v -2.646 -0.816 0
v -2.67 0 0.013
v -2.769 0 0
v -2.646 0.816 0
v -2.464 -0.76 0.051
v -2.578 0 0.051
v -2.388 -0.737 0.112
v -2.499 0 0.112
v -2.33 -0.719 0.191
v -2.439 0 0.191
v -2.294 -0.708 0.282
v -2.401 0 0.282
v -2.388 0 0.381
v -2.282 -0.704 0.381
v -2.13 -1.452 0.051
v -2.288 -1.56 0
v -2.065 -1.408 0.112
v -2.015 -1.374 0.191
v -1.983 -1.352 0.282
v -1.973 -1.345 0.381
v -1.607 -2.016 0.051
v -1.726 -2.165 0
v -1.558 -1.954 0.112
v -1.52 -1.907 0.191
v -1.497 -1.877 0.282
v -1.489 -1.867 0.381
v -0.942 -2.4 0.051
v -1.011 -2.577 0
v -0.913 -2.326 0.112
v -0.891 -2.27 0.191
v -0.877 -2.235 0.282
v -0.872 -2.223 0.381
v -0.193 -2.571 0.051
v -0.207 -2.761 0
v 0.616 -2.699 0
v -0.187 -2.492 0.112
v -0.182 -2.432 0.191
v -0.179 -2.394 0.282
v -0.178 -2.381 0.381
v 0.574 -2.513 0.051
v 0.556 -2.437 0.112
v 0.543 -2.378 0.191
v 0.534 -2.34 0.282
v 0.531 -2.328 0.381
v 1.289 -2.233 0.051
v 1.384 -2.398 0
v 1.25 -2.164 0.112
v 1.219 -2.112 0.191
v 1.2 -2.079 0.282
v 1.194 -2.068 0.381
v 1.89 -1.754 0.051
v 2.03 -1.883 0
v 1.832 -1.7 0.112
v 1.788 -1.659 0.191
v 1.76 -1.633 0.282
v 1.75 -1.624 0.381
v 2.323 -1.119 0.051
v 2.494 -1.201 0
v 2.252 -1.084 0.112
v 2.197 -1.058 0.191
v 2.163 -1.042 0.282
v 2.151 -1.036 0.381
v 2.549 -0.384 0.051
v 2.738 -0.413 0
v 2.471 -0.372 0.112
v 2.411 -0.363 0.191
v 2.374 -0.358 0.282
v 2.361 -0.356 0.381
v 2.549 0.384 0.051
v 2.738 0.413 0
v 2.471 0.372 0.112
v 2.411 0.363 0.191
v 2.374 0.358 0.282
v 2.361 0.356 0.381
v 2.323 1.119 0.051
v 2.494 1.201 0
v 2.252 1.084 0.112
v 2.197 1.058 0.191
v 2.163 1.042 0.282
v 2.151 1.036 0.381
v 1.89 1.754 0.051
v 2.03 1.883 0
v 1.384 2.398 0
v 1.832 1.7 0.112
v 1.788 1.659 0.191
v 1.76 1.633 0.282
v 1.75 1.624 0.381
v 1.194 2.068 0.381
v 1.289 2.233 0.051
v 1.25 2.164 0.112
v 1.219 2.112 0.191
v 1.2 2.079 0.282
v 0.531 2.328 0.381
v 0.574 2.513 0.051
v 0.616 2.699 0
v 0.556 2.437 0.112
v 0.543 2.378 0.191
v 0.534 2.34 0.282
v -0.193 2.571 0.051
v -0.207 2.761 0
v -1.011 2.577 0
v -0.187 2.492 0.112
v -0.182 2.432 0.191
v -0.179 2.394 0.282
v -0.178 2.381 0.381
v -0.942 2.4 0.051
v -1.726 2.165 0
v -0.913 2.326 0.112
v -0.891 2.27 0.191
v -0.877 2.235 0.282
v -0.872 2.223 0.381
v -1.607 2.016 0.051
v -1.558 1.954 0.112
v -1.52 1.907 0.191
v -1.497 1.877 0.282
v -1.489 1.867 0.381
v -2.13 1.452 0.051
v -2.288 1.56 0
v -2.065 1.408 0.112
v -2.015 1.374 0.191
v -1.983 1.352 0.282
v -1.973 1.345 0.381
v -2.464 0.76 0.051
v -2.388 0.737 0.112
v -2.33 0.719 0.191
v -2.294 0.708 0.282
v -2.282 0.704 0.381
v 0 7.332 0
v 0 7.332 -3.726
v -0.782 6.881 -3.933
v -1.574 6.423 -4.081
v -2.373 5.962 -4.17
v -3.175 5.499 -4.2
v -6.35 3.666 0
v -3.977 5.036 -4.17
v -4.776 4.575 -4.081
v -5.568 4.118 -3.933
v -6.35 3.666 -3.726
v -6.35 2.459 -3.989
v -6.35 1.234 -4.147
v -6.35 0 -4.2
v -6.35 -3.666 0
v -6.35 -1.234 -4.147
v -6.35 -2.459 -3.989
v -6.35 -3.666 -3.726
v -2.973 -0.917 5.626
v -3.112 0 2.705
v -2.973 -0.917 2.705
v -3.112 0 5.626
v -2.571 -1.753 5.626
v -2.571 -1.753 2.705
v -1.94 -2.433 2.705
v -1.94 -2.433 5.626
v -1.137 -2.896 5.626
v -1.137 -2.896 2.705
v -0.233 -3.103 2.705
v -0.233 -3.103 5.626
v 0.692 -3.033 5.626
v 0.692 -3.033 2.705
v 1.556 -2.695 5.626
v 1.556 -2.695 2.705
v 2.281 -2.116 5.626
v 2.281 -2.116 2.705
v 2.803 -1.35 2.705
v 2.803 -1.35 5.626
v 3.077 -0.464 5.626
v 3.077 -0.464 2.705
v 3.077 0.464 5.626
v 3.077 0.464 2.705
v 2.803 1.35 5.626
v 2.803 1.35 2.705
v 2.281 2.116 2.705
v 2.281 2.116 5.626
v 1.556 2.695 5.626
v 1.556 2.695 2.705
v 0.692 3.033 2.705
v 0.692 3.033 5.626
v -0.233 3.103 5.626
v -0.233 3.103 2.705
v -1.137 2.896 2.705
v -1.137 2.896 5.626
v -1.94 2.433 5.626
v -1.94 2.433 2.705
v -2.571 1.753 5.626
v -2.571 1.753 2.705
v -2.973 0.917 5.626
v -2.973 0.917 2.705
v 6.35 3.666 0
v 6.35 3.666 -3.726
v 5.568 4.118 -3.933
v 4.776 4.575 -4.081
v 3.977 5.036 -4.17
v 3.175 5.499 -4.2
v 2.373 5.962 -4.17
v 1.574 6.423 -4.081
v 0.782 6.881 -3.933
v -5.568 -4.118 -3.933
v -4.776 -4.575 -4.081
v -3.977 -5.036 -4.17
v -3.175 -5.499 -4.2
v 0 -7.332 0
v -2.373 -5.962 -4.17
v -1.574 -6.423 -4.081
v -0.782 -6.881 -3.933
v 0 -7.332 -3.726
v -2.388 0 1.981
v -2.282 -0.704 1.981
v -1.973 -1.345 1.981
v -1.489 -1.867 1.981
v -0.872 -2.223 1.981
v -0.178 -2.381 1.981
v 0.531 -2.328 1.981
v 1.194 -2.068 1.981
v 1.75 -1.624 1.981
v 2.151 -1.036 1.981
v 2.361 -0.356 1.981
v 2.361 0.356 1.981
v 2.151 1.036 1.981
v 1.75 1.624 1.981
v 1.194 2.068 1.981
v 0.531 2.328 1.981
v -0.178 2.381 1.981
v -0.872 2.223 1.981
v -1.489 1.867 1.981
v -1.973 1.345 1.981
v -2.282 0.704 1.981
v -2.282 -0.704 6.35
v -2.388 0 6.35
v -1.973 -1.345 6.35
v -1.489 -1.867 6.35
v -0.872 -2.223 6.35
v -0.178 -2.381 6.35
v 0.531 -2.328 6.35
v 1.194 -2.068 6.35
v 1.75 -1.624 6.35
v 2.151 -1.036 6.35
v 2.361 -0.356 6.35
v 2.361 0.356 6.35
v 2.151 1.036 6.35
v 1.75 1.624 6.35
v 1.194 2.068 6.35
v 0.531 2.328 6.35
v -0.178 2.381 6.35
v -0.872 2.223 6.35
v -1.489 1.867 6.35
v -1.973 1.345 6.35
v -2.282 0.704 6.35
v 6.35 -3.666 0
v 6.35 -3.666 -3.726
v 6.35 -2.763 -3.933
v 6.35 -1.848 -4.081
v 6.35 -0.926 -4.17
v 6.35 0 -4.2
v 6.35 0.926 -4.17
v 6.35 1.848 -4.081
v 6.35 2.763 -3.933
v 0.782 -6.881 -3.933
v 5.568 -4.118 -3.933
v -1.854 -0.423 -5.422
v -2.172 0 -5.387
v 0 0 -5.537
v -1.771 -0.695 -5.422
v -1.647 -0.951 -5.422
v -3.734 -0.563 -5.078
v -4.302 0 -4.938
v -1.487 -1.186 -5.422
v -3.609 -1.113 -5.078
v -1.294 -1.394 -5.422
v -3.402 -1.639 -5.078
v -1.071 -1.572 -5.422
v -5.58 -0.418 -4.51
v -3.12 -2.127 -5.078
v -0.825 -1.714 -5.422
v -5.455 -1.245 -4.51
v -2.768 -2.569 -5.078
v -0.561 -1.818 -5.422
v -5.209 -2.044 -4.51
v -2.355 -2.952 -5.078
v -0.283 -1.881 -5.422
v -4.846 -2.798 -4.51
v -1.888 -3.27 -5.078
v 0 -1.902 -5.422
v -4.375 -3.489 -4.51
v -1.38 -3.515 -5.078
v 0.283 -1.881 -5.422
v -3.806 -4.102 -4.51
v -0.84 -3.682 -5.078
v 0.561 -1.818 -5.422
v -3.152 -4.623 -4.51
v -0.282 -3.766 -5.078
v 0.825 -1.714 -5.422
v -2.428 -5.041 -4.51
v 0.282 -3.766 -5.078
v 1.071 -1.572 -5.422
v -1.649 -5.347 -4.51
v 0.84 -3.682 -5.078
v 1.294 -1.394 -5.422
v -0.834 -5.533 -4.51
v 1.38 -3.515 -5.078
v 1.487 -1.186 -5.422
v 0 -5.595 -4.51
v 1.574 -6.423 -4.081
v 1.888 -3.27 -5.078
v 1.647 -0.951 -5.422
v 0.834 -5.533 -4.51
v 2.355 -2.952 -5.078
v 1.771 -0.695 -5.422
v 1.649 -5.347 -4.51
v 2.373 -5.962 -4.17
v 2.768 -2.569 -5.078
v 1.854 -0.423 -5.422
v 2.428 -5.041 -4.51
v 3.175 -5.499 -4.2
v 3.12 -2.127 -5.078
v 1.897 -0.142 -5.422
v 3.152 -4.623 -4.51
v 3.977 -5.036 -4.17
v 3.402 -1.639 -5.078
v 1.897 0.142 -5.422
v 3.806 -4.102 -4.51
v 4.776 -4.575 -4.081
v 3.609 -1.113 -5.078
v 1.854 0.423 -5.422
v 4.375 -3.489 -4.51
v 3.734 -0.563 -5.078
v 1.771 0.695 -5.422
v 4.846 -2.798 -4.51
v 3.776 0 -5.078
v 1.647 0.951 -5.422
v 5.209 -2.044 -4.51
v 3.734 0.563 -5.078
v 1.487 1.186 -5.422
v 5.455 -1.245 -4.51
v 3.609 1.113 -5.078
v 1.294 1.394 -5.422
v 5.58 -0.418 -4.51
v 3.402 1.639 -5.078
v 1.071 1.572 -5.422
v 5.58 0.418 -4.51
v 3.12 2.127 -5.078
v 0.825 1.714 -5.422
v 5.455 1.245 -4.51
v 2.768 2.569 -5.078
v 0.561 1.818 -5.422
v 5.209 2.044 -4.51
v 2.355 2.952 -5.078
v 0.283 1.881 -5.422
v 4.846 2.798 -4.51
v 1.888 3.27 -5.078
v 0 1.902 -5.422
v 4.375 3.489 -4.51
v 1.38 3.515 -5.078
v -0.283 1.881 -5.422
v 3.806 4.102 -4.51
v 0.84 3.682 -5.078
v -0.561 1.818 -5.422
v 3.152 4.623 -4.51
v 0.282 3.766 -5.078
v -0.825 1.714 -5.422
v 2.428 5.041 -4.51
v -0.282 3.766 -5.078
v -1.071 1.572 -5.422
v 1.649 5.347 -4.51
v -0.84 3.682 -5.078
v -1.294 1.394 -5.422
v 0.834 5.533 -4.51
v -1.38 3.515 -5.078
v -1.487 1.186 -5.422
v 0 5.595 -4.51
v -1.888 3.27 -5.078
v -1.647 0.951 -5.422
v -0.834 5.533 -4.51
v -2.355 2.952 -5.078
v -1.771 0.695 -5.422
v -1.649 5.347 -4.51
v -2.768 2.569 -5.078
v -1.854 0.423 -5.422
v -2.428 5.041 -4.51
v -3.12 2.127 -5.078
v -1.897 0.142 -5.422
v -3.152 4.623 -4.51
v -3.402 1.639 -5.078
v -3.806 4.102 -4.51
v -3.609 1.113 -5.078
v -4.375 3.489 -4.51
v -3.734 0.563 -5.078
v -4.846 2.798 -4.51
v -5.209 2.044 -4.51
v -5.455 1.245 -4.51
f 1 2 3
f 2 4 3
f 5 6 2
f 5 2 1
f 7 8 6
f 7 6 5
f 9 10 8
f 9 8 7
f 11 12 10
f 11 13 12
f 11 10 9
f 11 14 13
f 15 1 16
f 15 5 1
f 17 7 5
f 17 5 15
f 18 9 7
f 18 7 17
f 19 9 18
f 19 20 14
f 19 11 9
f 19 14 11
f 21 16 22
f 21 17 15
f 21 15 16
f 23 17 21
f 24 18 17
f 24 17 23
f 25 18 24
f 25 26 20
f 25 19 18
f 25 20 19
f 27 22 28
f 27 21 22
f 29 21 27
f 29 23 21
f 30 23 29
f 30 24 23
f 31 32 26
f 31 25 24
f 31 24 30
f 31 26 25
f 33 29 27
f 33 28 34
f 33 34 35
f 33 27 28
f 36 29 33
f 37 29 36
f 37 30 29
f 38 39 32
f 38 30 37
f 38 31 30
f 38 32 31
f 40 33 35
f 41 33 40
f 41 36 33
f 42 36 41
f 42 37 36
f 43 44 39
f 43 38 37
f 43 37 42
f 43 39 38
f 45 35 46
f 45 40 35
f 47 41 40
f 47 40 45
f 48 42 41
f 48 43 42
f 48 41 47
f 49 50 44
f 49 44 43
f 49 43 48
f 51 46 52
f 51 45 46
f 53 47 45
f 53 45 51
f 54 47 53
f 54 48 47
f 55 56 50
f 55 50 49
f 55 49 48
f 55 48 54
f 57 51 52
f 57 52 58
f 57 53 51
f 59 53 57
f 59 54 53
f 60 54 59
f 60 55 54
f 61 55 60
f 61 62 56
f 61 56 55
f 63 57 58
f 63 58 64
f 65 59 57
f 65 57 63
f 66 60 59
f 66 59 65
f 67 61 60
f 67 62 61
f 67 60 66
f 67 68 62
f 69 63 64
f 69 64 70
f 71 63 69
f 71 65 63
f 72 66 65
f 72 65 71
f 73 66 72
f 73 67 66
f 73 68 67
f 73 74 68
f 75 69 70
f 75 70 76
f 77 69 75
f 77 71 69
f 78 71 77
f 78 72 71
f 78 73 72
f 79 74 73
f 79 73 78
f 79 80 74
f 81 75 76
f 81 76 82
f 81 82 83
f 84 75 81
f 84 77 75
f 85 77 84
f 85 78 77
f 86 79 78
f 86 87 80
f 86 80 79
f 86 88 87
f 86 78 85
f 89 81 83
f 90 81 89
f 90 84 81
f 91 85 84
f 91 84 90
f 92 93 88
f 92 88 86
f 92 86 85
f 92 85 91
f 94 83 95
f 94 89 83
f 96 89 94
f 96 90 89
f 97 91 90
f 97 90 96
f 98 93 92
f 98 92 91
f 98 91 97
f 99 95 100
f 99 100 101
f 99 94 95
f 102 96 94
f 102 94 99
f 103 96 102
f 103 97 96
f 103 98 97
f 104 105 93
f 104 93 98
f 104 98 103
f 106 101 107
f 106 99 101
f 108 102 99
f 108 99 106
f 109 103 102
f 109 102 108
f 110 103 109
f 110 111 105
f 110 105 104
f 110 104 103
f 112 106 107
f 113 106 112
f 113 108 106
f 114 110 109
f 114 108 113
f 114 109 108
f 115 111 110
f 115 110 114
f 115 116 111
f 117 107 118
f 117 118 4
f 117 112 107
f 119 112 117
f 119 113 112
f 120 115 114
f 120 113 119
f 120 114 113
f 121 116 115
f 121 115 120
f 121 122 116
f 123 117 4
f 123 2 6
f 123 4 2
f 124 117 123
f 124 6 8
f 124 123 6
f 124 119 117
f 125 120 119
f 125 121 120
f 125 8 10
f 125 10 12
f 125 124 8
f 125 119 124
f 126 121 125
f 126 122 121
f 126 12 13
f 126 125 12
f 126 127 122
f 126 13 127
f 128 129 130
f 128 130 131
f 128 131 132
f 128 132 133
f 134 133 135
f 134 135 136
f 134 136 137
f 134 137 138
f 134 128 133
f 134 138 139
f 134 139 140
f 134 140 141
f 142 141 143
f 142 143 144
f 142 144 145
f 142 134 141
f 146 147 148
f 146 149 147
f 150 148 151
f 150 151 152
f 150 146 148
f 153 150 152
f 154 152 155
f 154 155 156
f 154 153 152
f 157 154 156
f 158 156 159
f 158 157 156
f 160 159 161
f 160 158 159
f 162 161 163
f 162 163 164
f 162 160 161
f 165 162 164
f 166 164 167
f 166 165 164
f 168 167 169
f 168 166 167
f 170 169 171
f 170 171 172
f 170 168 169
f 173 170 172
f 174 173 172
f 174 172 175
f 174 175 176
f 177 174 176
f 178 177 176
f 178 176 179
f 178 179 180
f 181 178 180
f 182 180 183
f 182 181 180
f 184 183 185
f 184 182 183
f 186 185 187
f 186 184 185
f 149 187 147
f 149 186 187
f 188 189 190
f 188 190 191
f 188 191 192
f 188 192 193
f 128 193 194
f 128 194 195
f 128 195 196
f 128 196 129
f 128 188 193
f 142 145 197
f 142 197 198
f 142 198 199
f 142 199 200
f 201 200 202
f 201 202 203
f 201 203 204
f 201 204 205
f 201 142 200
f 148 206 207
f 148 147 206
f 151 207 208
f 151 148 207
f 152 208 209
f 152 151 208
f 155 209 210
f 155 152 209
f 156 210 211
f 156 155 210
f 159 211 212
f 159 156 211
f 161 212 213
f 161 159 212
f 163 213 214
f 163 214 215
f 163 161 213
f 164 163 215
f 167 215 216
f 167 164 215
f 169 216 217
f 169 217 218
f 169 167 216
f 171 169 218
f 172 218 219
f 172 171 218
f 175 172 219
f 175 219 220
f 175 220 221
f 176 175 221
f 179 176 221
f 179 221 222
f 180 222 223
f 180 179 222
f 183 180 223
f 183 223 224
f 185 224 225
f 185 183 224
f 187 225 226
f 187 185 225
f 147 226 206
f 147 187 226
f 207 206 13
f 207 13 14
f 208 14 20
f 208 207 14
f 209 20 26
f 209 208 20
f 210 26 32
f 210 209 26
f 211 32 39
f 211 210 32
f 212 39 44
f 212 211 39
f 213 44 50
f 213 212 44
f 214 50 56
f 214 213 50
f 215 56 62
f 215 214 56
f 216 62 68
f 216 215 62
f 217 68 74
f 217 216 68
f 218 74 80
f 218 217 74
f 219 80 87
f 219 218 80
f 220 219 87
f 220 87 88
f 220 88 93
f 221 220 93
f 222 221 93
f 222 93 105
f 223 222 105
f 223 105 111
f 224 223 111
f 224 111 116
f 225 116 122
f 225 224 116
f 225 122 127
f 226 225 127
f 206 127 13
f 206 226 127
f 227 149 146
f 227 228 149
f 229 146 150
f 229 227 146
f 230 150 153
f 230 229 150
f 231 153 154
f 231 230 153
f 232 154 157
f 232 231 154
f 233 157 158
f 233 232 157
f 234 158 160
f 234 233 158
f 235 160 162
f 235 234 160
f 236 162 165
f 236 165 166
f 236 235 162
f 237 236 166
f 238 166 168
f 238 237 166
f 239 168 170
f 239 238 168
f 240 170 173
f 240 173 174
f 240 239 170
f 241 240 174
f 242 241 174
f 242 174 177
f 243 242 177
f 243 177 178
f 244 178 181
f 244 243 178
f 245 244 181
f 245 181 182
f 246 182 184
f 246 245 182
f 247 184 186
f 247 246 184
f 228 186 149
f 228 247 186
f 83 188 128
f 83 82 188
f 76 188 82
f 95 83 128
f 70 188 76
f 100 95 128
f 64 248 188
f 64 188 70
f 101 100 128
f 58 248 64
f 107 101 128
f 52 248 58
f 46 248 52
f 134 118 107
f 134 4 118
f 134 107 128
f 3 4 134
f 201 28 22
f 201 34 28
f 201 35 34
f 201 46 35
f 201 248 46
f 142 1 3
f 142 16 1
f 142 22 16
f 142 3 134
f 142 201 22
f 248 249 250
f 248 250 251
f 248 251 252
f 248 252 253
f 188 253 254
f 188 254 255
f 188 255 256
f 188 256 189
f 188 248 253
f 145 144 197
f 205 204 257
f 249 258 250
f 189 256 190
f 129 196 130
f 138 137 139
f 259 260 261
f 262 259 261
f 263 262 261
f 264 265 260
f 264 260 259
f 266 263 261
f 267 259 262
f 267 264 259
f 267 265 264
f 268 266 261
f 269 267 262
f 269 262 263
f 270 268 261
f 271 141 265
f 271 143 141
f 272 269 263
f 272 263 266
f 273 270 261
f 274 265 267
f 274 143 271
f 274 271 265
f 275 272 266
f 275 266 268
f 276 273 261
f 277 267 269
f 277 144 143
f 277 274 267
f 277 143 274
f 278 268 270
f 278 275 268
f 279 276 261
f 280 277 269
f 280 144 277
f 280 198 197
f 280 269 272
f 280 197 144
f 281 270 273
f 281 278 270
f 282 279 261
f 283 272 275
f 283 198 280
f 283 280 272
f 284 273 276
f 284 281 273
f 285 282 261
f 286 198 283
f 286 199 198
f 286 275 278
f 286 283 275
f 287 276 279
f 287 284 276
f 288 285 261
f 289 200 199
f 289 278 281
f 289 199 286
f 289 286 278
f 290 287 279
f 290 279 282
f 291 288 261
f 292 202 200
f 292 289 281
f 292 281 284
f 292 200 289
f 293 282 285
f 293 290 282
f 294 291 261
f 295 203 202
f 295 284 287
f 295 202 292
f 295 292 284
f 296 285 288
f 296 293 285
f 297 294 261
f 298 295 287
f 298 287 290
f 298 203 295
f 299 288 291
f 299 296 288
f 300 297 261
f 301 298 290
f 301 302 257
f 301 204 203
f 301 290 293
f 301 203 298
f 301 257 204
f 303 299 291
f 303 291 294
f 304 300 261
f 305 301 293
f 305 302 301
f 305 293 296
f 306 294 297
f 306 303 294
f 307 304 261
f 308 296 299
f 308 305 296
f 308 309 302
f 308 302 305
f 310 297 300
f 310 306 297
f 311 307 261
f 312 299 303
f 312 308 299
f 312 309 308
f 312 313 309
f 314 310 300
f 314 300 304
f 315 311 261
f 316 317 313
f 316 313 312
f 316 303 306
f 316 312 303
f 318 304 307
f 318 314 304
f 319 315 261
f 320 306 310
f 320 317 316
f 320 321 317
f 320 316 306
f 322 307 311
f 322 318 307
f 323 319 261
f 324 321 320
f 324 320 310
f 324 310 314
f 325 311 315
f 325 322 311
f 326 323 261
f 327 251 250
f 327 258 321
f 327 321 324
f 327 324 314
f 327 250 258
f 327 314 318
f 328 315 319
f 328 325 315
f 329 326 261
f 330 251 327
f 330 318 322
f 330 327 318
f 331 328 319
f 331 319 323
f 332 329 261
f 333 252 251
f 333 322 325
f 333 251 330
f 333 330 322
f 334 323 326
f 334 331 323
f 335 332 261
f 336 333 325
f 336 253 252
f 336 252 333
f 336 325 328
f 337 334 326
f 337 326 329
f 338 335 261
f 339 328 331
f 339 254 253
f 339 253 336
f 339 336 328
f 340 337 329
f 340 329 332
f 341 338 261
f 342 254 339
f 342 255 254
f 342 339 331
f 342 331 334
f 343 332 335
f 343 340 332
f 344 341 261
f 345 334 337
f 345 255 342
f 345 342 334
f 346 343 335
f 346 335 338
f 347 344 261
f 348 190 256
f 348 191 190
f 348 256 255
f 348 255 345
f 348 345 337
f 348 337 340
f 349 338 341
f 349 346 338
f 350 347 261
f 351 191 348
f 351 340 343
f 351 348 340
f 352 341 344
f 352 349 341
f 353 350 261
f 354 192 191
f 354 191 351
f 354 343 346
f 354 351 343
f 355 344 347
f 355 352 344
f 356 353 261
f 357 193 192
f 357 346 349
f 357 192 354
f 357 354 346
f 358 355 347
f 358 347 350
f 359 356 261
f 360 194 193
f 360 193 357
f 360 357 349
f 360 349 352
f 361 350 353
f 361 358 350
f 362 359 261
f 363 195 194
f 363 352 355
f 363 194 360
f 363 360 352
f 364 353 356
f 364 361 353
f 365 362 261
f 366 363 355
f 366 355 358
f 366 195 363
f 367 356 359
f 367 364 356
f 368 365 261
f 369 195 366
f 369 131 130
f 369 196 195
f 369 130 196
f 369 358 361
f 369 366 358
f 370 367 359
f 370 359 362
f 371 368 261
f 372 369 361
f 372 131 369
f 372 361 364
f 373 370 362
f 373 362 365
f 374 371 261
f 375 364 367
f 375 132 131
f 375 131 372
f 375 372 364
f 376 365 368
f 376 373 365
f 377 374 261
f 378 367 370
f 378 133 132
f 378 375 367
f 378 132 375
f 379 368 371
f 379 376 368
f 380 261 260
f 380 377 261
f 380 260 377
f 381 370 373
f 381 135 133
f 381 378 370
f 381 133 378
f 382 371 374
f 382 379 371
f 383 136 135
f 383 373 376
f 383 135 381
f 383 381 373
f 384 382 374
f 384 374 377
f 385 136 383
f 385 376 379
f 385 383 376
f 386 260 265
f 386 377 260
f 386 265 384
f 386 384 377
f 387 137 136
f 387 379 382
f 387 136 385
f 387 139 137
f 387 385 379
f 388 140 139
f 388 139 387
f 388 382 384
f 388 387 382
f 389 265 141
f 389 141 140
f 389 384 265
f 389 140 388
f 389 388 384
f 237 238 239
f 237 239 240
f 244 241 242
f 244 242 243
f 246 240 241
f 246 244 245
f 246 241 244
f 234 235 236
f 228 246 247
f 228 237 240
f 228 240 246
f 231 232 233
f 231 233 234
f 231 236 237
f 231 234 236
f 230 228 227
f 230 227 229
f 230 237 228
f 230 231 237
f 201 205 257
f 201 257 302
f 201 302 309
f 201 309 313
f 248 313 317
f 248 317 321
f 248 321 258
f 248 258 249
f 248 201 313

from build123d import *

# Parameters (mm, degrees)
SKETCH2_OUTSIDE_W  = 33.164
SKETCH2_OUTSIDE_H  = 33.164
CUT_EXTRUDE1_DEPTH = 6.5372
FILLET1_R          = 0.381


with BuildPart() as part:
    # Sketch1 → Revolve1 (revolve)
    with BuildSketch(Plane(origin=(0, 0, 0), x_dir=(0, 0, -1), z_dir=(1, 0, 0)), mode=Mode.PRIVATE) as revolve1_sk:
        with BuildLine():
            Line((0, 11.989122877), (0, 2.3876))
            Line((0, 2.3876), (-1.9812, 2.3876))
            Line((-1.9812, 2.3876), (-2.7051, 3.1115))
            Line((-2.7051, 3.1115), (-5.6261, 3.1115))
            Line((-5.6261, 3.1115), (-6.35, 2.3876))
            Line((-6.35, 2.3876), (-6.35, 0))
            Line((-6.35, 0), (5.5372, 0))
            ThreePointArc((5.5372, 0), (4.086038504, 6.603023005), (0, 11.989122877))
        make_face()
    revolve(revolve1_sk.sketch.rotate(Axis((0, 0, 0), (0, 0, 1)), 90), axis=Axis((0, 0, 0), (0, 0, 1)))  # turned: the seam where the file's is

    # Sketch2 outside → Cut-Extrude1 (cut, through all)
    with BuildSketch(Plane.XY):
        Rectangle(SKETCH2_OUTSIDE_W, SKETCH2_OUTSIDE_H)
        Polygon((0, 7.332348419), (-6.35, 3.666174209), (-6.35, -3.666174209), (0, -7.332348419), (6.35, -3.666174209), (6.35, 3.666174209), align=None, mode=Mode.SUBTRACT)
    extrude(amount=-CUT_EXTRUDE1_DEPTH, mode=Mode.SUBTRACT)

    # Fillet1
    fillet1_edges = [part.edges().sort_by_distance(p)[0] for p in [
        (2.3876, 0, 0),
    ]]
    fillet(fillet1_edges, radius=FILLET1_R)


solid = part.part
